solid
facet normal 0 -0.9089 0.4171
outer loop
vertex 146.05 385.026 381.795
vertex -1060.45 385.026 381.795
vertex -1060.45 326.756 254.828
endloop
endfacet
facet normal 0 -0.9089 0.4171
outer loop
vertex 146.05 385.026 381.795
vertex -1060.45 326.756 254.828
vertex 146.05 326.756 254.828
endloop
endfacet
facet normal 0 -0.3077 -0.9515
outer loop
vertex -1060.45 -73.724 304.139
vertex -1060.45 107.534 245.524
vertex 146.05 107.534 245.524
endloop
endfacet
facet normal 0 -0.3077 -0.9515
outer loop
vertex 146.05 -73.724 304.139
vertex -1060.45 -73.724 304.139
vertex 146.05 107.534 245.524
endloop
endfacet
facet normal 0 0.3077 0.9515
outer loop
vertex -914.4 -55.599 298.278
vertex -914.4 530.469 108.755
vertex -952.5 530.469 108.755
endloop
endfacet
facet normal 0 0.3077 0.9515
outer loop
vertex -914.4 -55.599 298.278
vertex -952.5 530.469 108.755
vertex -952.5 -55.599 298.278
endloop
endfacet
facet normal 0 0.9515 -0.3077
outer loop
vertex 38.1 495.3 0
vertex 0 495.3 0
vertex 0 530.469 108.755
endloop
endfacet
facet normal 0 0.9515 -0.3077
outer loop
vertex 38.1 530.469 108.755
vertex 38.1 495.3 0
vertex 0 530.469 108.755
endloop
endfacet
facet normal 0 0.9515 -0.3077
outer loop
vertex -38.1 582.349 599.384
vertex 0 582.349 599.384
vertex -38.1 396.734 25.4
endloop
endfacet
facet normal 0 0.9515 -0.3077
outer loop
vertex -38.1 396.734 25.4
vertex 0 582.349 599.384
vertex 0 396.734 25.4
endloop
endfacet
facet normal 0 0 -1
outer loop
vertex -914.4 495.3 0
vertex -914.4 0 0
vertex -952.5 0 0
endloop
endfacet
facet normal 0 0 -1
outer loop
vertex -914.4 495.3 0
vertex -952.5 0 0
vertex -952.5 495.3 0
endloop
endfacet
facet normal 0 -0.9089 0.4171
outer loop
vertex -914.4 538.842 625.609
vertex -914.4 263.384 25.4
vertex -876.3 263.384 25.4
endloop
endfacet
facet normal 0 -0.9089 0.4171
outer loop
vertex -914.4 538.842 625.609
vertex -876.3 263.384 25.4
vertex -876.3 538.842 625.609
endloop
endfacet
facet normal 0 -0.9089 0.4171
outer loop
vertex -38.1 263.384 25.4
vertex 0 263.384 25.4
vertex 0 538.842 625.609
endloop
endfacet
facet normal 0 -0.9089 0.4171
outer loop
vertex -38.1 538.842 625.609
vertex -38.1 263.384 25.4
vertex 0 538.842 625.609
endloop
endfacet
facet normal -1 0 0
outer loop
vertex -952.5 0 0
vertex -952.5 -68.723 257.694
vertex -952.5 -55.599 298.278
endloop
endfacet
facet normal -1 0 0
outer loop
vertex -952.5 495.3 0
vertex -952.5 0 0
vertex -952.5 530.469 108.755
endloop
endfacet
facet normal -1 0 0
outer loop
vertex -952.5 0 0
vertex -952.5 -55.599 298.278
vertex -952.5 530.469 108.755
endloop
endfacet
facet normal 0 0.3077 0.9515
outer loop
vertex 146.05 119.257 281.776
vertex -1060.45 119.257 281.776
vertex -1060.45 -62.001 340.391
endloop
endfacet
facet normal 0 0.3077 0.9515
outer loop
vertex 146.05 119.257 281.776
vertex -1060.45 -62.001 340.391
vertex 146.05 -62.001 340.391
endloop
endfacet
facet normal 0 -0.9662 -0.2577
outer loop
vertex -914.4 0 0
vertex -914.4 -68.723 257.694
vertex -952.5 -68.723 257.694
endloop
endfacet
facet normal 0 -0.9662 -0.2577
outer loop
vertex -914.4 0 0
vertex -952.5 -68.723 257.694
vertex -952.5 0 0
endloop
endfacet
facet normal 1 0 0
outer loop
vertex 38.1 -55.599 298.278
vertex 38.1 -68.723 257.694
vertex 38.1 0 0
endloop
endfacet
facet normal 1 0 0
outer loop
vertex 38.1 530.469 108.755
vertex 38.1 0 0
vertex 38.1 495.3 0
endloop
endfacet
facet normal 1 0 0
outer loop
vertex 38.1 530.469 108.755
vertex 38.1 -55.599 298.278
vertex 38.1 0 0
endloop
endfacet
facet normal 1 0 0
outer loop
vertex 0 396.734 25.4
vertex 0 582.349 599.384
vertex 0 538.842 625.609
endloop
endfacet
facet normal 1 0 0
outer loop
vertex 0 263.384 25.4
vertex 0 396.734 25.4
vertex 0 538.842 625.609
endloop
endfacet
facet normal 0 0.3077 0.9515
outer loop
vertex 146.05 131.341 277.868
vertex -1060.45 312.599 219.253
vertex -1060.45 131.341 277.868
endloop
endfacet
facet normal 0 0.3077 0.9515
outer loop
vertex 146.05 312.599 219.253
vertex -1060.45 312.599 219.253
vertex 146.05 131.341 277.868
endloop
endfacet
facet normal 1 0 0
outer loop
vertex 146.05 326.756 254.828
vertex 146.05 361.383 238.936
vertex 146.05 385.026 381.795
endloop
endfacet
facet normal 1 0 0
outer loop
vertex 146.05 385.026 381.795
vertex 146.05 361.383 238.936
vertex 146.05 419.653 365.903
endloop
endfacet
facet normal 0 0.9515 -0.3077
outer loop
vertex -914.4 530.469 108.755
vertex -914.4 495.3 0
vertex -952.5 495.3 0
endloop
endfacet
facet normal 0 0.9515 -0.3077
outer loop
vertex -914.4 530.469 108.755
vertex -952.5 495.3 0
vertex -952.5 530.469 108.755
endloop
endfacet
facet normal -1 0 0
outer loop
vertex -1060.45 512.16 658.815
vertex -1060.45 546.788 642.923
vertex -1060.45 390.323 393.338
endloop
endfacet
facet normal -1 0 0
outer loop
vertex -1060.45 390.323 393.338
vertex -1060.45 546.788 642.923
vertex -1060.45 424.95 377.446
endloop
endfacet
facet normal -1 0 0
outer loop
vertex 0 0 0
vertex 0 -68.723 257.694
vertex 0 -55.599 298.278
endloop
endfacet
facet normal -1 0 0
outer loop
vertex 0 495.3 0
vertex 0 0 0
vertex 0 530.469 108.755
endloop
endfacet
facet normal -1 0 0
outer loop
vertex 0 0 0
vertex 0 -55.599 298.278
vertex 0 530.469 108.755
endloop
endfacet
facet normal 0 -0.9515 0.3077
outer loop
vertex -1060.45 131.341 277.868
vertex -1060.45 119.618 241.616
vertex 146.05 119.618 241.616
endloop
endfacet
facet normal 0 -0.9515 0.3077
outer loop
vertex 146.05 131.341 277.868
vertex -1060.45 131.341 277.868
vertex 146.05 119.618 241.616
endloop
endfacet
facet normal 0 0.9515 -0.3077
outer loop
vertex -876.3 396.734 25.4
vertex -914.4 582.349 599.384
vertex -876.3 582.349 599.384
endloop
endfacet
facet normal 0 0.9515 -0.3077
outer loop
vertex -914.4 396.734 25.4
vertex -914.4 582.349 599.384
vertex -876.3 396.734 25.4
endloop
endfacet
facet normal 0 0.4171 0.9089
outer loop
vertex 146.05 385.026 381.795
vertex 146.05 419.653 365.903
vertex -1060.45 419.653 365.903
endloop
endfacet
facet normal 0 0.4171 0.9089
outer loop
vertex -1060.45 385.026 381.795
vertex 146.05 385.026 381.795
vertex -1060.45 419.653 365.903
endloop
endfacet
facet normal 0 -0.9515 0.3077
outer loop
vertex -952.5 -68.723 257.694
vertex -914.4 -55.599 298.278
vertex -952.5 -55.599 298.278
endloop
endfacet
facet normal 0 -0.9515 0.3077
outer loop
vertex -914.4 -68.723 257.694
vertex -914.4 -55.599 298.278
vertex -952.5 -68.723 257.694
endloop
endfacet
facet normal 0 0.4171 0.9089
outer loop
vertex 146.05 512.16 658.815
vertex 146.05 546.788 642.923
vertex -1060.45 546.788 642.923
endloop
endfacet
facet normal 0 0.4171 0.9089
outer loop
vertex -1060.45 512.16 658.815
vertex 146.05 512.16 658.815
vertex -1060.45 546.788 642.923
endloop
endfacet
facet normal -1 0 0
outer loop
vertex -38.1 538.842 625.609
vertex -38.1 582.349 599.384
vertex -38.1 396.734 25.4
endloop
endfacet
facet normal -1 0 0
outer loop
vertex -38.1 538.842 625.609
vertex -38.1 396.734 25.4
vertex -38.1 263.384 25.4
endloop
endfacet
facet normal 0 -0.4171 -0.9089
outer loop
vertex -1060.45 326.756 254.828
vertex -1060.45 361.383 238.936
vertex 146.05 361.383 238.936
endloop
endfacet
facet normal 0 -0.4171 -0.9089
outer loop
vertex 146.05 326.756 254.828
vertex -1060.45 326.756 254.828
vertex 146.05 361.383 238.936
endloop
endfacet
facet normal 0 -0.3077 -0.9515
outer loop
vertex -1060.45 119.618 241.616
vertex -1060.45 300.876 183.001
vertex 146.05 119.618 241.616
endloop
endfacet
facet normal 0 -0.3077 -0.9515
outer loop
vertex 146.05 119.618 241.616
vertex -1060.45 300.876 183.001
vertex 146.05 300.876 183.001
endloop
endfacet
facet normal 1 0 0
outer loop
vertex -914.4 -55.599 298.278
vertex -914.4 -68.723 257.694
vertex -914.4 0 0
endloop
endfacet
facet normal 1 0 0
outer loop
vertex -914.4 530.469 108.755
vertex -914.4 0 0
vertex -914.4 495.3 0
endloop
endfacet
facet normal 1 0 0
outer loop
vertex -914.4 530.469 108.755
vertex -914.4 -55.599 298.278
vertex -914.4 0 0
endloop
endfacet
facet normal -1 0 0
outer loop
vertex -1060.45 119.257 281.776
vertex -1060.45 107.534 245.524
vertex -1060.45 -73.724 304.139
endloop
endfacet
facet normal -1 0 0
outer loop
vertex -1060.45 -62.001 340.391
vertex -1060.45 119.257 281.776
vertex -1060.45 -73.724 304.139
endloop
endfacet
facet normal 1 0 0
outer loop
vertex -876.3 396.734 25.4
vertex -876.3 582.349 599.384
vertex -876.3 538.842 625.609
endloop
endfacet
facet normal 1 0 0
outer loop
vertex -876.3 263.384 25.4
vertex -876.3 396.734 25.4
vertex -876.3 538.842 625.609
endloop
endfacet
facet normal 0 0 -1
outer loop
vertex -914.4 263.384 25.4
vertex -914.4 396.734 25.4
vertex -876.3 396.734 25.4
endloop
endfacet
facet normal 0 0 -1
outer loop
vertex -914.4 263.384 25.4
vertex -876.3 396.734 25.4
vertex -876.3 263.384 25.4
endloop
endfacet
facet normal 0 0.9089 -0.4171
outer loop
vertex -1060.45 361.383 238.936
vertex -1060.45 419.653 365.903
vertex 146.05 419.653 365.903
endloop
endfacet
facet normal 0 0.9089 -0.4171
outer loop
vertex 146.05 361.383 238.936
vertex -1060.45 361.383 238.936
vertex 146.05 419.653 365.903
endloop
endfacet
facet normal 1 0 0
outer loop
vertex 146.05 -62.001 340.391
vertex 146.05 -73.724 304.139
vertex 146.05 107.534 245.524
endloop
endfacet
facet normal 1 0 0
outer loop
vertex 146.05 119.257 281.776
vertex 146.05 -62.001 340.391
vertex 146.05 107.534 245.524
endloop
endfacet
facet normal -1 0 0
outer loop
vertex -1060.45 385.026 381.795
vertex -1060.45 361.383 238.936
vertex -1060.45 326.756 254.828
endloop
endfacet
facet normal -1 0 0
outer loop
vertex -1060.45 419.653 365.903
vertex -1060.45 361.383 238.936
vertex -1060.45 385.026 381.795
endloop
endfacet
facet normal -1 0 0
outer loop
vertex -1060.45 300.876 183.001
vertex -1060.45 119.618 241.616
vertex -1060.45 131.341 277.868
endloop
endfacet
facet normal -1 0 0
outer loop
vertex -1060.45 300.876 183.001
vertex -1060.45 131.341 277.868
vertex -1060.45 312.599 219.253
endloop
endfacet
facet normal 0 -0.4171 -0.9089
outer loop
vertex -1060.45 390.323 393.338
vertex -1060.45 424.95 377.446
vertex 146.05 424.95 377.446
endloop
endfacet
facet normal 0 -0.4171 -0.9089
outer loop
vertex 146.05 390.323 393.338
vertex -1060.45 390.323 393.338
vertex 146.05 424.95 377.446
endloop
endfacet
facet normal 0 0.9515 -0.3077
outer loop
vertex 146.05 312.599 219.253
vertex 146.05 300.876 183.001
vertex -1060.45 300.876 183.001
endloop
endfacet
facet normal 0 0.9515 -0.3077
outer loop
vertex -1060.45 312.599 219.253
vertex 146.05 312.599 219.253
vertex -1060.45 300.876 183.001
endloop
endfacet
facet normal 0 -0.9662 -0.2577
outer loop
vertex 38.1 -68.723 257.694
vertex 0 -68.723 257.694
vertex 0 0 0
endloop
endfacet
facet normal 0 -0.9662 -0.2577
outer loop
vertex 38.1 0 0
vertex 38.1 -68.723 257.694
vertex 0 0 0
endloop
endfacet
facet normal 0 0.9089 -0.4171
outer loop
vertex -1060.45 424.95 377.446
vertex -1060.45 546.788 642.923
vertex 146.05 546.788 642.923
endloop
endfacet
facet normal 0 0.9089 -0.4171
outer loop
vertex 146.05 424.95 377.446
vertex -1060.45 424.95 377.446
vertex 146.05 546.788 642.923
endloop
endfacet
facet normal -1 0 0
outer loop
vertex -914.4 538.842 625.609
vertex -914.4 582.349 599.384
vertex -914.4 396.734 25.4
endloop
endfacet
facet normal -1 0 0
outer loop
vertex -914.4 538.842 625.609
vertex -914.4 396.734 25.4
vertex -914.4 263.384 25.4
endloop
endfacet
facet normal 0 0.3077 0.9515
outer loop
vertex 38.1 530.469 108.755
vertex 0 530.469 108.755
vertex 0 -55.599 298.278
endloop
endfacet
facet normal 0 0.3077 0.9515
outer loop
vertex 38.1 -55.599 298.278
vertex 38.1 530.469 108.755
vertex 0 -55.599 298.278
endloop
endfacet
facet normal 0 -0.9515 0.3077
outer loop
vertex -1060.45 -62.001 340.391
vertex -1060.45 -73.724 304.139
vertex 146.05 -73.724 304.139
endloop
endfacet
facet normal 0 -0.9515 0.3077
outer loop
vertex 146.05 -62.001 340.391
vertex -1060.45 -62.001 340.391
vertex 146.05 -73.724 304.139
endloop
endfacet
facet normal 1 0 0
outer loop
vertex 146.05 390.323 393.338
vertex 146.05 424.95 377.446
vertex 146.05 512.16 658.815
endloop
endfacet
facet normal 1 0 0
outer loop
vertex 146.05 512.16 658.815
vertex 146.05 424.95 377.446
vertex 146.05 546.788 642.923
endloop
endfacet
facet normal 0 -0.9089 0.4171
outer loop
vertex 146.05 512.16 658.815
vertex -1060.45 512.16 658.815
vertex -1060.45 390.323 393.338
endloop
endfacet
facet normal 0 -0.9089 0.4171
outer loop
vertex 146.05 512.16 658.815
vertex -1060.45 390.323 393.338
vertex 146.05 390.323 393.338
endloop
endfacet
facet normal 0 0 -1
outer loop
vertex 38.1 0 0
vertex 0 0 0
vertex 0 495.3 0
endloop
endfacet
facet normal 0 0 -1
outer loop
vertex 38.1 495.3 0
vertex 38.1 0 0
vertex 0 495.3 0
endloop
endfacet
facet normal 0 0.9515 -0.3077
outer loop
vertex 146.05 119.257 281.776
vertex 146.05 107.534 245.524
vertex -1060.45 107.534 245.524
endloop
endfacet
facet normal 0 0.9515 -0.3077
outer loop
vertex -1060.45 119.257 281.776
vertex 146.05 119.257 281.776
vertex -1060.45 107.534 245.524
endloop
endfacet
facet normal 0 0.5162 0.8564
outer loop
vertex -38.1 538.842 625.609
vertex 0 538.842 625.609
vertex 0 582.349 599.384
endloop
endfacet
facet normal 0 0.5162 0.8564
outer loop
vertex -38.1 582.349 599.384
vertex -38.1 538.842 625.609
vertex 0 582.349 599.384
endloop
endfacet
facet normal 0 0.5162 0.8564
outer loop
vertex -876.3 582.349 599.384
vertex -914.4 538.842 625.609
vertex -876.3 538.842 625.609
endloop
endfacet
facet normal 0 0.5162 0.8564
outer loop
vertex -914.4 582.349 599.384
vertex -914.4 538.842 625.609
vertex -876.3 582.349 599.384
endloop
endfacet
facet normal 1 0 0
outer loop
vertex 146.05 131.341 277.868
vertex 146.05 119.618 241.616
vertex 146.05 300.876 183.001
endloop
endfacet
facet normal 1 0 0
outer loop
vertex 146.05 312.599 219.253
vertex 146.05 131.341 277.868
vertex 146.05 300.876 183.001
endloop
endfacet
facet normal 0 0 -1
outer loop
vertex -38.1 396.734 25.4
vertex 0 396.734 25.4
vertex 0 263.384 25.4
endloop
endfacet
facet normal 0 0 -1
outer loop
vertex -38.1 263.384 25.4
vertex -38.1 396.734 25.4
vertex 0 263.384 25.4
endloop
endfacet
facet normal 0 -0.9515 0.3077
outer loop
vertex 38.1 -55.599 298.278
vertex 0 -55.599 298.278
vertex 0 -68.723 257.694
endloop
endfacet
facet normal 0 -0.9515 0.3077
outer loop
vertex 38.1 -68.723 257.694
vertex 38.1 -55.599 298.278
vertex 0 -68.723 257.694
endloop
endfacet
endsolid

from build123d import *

# Parameters (mm, degrees)
F1_DEPTH = 38.1
F3_DEPTH = 38.1
F6_W     = 38.1
F6_H     = 273.05
F7_DEPTH = 38.1
F6_W_2   = 1022.35
F6_H_2   = 139.7
F6_W_3   = 146.05
F8_W     = 38.1
F8_H     = 171.45
F9_DEPTH = 38.1
F8_W_2   = 1060.45
F8_H_2   = 190.5
F8_W_3   = 107.95


with BuildPart() as f1:
    # F0 (on Right) → F1 (new body)
    with BuildSketch(Plane.YZ):
        Polygon((-68.7226475372, 257.6937867227), (0, 0), (495.3, 0), (530.4692307692, 108.7548399249), (-55.5985177152, 298.277916848), align=None)
    extrude(amount=F1_DEPTH)


with BuildPart() as f3:
    # F2 (on face) → F3 (new body)
    with BuildSketch(Plane(origin=(0, 0, 0), x_dir=(0, -1, 0), z_dir=(-1, 0, 0))):
        Polygon((-433.7982619471, 140.0163783865), (-331.2104274496, 173.1913178011), (-538.8416894006, 625.6090952361), (-582.3489066006, 599.3838773817), align=None)
        Polygon((-396.7335219852, 25.4), (-263.3835219852, 25.4), (-331.2104274496, 173.1913178011), (-433.7982619471, 140.0163783865), align=None)
    extrude(amount=F3_DEPTH)


with BuildPart() as f5_1:
    # F5: instance of F1
    add(f1.part.mirror(Plane.YZ.offset(-457.2)))


with BuildPart() as f5_2:
    # F5: instance of F3
    add(f3.part.mirror(Plane.YZ.offset(-457.2)))


with BuildPart() as f7:
    # F6 (on face) → F7 (new body)
    with BuildSketch(Plane(origin=(0, 207.9313582565, -95.4273957995), x_dir=(1, 0, 0), z_dir=(0, -0.9088568977, 0.417108067))):
        Polygon((146.05, 812.3943569238), (-1060.45, 812.3943569238), (-1060.45, 520.2943569238), (-38.1, 520.2943569238), (-38.1, 793.3443569238), (0, 793.3443569238), (0, 520.2943569238), (146.05, 520.2943569238), align=None)
        with Locations((-19.05, 656.8193569238)):
            Rectangle(F6_W, F6_H)
    extrude(amount=F7_DEPTH)


with BuildPart() as f7b:
    # F6 (on face) → F7, piece 2 (new body)
    with BuildSketch(Plane(origin=(0, 207.9313582565, -95.4273957995), x_dir=(1, 0, 0), z_dir=(0, -0.9088568977, 0.417108067))):
        with Locations((-549.275, 437.7443569238)):
            Rectangle(F6_W_2, F6_H_2)
        with Locations((73.025, 437.7443569238)):
            Rectangle(F6_W_3, F6_H_2)
        with Locations((-19.05, 437.7443569238)):
            Rectangle(F6_W, F6_H_2)
    extrude(amount=F7_DEPTH)


with BuildPart() as f9:
    # F8 (on face) → F9 (new body)
    with BuildSketch(Plane(origin=(0, 82.0615384615, 253.7612931582), x_dir=(1, 0, 0), z_dir=(0, 0.3076923077, 0.9514859136))):
        Polygon((-1060.45, 26.7709730081), (-1060.45, -163.7290269919), (146.05, -163.7290269919), (146.05, 26.7709730081), (38.1, 26.7709730081), (38.1, -144.6790269919), (0, -144.6790269919), (0, 26.7709730081), align=None)
        with Locations((19.05, -58.9540269919)):
            Rectangle(F8_W, F8_H)
    extrude(amount=F9_DEPTH)


with BuildPart() as f9b:
    # F8 (on face) → F9, piece 2 (new body)
    with BuildSketch(Plane(origin=(0, 82.0615384615, 253.7612931582), x_dir=(1, 0, 0), z_dir=(0, 0.3076923077, 0.9514859136))):
        with Locations((-530.225, 134.7209730081)):
            Rectangle(F8_W_2, F8_H_2)
        with Locations((92.075, 134.7209730081)):
            Rectangle(F8_W_3, F8_H_2)
        with Locations((19.05, 134.7209730081)):
            Rectangle(F8_W, F8_H_2)
    extrude(amount=F9_DEPTH)


solid = Compound([f1.part, f3.part, f5_1.part, f5_2.part, f7.part, f7b.part, f9.part, f9b.part])
